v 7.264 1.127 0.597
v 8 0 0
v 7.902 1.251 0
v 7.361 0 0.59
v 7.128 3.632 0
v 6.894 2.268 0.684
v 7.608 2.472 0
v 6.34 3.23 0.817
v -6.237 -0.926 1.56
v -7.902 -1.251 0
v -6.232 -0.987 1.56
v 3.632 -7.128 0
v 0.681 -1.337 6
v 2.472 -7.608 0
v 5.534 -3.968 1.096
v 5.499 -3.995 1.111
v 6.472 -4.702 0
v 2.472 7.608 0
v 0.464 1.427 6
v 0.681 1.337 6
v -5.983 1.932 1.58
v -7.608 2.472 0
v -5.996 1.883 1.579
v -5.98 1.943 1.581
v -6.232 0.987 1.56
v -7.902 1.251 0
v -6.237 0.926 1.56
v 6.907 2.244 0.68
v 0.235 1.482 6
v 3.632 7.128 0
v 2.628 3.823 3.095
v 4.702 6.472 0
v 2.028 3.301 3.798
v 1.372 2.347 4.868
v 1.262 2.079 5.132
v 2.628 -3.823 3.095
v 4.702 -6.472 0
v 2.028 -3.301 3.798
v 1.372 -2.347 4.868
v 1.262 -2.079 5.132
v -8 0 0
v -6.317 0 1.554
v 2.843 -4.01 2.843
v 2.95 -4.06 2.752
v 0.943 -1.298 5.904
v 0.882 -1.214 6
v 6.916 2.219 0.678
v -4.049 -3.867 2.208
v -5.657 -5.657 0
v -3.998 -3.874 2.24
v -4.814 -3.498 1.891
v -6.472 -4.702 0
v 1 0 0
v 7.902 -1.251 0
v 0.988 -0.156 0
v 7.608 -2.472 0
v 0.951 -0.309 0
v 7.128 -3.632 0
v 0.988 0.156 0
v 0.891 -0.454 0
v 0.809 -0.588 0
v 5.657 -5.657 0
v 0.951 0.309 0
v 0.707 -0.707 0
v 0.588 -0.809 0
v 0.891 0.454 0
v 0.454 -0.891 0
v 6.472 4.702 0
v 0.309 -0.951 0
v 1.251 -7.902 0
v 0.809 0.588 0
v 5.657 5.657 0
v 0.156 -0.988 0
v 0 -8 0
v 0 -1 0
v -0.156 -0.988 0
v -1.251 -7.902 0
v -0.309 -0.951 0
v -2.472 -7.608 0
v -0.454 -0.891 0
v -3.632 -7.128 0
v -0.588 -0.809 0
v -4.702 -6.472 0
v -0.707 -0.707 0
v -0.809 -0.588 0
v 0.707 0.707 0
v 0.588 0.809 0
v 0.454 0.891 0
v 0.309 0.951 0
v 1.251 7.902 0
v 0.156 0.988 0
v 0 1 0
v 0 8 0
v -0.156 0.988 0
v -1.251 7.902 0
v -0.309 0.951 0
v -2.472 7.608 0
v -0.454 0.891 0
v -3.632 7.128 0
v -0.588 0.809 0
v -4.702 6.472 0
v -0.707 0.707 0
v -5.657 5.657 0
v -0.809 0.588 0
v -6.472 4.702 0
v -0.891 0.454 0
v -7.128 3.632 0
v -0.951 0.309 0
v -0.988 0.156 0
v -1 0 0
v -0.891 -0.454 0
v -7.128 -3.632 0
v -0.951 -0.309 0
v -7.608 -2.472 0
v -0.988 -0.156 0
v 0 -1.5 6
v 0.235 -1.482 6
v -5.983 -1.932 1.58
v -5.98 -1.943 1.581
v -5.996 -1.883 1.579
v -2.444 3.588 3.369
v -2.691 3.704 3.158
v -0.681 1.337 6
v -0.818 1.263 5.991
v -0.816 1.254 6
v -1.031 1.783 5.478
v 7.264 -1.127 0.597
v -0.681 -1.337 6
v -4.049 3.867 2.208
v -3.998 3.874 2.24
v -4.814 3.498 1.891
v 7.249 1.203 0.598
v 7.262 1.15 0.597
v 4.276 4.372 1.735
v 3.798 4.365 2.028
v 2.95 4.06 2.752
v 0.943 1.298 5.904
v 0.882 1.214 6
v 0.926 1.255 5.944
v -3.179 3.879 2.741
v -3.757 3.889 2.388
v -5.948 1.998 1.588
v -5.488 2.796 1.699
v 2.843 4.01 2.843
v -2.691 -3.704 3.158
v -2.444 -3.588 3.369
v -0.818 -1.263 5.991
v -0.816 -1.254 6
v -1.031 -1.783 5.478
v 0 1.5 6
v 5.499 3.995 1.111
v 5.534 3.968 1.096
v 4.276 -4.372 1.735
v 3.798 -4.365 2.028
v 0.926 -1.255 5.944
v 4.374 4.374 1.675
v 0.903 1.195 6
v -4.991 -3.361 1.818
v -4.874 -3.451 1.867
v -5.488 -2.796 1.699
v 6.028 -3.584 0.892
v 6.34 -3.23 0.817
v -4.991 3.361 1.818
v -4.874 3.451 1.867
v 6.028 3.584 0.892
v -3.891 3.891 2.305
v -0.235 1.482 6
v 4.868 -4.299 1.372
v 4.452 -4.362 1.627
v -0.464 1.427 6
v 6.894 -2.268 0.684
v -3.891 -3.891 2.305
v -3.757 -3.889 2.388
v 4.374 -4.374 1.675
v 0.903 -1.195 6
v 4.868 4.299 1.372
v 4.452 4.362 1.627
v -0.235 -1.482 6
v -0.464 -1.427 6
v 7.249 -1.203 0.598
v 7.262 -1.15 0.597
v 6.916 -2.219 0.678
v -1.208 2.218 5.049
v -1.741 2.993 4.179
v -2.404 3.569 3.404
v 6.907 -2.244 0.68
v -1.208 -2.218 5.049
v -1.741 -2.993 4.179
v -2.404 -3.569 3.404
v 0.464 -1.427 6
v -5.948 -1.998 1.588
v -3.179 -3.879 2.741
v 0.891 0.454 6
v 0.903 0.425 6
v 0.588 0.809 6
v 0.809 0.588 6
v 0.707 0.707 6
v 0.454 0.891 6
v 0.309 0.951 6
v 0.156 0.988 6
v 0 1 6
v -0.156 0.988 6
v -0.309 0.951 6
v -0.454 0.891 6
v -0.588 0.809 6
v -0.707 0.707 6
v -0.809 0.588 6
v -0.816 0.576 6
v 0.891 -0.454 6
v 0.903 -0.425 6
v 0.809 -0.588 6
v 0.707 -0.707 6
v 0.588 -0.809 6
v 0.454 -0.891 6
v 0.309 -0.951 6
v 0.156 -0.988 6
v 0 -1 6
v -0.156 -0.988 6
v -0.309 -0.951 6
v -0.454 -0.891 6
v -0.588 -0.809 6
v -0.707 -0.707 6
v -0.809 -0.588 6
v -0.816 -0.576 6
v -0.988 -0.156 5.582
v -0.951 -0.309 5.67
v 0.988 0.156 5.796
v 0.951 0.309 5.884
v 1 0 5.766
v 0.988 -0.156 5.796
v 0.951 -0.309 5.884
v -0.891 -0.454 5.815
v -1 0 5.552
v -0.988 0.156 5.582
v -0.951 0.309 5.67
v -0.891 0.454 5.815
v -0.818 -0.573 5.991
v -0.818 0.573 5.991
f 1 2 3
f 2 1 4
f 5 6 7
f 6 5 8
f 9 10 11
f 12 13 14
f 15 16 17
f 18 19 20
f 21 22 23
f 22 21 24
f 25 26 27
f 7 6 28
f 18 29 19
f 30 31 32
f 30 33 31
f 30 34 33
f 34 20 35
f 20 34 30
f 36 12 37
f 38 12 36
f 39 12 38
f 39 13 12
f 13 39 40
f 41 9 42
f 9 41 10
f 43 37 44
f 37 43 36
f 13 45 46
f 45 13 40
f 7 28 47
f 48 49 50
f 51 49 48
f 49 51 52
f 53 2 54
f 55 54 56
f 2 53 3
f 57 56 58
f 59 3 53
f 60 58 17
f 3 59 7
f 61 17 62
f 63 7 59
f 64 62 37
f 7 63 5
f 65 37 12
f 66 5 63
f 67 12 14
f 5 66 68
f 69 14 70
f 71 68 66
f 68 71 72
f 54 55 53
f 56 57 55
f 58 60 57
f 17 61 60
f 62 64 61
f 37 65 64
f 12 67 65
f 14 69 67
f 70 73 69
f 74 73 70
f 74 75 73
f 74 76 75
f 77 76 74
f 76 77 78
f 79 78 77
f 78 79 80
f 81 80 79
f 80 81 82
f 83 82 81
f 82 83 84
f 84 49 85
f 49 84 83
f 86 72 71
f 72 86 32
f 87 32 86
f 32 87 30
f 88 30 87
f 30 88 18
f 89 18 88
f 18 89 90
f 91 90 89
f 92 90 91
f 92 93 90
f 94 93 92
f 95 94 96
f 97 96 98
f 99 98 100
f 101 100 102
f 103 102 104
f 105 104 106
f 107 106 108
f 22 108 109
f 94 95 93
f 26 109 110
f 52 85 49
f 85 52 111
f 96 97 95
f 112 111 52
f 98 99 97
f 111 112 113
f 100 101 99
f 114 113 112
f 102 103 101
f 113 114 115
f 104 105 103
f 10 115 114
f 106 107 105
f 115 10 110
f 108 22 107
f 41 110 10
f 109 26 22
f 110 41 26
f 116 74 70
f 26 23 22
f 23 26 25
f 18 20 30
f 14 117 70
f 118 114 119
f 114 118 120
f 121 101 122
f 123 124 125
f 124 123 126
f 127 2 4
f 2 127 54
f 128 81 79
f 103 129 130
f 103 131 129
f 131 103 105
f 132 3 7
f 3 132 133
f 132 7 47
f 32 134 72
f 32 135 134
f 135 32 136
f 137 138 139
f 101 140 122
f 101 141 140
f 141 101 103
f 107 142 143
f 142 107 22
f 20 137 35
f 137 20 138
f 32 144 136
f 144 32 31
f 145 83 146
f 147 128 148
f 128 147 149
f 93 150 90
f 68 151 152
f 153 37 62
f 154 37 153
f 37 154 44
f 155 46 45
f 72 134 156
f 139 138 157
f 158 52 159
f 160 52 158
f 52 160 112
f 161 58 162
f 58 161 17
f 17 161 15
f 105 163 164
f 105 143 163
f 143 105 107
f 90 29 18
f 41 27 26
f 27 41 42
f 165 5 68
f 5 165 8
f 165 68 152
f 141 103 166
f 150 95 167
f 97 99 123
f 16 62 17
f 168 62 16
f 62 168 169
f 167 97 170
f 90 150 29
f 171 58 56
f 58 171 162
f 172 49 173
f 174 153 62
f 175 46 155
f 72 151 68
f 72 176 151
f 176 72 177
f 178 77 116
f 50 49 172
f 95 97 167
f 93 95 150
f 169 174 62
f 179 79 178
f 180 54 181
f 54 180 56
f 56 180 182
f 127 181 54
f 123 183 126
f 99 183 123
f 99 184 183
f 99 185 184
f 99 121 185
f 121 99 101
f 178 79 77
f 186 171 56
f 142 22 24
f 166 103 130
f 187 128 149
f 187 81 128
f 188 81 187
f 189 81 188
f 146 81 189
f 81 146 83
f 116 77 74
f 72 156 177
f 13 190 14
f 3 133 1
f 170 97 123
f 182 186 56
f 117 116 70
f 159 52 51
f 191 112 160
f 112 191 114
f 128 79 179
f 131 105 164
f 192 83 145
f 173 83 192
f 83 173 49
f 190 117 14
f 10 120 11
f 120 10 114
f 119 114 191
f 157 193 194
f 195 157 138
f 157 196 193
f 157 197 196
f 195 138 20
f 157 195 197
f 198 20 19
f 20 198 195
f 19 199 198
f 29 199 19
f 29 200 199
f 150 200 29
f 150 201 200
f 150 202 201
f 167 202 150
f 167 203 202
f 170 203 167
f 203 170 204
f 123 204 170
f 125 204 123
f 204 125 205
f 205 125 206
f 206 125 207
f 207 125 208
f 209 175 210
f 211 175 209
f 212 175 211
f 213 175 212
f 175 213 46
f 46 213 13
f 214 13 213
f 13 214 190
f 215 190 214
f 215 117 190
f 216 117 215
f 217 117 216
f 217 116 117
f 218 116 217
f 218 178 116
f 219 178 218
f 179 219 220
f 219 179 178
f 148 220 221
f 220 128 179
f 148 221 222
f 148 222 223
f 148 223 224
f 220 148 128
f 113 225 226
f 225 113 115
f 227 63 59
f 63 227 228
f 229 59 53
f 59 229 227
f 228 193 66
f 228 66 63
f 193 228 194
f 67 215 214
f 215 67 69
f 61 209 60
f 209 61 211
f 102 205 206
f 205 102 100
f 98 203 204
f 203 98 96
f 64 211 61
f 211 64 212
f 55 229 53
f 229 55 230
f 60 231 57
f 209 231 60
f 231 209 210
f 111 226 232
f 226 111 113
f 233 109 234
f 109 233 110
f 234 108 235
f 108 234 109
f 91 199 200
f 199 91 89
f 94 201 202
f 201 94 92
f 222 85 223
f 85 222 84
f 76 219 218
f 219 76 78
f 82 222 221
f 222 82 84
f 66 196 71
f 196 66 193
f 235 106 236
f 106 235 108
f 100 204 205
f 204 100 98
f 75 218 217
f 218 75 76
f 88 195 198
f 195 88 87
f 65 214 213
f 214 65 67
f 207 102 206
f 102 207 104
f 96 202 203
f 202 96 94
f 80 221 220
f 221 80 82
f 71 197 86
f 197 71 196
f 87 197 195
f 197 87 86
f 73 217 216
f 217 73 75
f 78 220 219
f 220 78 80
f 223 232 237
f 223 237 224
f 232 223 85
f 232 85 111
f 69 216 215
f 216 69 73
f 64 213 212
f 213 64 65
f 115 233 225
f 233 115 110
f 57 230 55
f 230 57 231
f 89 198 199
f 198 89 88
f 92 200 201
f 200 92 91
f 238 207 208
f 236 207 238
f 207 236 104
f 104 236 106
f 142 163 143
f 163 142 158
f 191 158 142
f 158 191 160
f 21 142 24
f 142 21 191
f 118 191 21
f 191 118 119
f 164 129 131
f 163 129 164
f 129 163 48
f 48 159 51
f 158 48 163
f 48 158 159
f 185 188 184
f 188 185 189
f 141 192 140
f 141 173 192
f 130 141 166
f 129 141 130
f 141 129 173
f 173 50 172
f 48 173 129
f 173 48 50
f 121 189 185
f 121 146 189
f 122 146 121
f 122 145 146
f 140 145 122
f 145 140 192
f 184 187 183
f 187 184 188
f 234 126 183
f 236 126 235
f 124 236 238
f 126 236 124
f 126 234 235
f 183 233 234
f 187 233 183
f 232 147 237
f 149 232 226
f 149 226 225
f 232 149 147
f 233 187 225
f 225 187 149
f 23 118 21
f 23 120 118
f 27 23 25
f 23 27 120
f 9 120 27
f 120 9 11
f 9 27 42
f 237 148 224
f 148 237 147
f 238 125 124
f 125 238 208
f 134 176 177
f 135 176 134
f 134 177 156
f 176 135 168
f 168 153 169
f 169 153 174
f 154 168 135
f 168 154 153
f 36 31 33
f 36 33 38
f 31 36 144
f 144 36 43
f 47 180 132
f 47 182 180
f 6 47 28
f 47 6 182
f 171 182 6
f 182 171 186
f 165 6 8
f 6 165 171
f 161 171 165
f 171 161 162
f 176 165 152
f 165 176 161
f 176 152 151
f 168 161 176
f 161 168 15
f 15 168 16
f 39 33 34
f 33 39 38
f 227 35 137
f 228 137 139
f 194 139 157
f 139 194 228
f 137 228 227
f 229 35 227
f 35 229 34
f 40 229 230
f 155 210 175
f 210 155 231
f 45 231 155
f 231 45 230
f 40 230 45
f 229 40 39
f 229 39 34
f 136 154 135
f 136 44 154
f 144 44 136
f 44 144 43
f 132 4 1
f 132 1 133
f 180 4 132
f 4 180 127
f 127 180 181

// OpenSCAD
//bottom radius
r1=8;
//top radius
r2=1.5;
//hole radius
r3=1;
//height
h=6;
//left cylinder cutout
r4=6.5;
//right cylinder cutout
r5=8;
//clearance between bolt and top of hotend
clear1=1.5;
//clearance between bearing and top of hotend
clear2=0.5;

difference(){
	cylinder(r1=r1,r2=r2,h=h,$fn=40);
	translate([0,0,-0.05])
		cylinder(r=r3,h=h+0.1,$fn=40);
	translate([-r4-r3/2,25,clear1+r4])
		rotate([90,0,0])
			cylinder(r=r4,h=50,$fn=40);
	translate([r5+r3/2,25,clear2+r5])
		rotate([90,0,0])
			cylinder(r=r5,h=50,$fn=40);
}
